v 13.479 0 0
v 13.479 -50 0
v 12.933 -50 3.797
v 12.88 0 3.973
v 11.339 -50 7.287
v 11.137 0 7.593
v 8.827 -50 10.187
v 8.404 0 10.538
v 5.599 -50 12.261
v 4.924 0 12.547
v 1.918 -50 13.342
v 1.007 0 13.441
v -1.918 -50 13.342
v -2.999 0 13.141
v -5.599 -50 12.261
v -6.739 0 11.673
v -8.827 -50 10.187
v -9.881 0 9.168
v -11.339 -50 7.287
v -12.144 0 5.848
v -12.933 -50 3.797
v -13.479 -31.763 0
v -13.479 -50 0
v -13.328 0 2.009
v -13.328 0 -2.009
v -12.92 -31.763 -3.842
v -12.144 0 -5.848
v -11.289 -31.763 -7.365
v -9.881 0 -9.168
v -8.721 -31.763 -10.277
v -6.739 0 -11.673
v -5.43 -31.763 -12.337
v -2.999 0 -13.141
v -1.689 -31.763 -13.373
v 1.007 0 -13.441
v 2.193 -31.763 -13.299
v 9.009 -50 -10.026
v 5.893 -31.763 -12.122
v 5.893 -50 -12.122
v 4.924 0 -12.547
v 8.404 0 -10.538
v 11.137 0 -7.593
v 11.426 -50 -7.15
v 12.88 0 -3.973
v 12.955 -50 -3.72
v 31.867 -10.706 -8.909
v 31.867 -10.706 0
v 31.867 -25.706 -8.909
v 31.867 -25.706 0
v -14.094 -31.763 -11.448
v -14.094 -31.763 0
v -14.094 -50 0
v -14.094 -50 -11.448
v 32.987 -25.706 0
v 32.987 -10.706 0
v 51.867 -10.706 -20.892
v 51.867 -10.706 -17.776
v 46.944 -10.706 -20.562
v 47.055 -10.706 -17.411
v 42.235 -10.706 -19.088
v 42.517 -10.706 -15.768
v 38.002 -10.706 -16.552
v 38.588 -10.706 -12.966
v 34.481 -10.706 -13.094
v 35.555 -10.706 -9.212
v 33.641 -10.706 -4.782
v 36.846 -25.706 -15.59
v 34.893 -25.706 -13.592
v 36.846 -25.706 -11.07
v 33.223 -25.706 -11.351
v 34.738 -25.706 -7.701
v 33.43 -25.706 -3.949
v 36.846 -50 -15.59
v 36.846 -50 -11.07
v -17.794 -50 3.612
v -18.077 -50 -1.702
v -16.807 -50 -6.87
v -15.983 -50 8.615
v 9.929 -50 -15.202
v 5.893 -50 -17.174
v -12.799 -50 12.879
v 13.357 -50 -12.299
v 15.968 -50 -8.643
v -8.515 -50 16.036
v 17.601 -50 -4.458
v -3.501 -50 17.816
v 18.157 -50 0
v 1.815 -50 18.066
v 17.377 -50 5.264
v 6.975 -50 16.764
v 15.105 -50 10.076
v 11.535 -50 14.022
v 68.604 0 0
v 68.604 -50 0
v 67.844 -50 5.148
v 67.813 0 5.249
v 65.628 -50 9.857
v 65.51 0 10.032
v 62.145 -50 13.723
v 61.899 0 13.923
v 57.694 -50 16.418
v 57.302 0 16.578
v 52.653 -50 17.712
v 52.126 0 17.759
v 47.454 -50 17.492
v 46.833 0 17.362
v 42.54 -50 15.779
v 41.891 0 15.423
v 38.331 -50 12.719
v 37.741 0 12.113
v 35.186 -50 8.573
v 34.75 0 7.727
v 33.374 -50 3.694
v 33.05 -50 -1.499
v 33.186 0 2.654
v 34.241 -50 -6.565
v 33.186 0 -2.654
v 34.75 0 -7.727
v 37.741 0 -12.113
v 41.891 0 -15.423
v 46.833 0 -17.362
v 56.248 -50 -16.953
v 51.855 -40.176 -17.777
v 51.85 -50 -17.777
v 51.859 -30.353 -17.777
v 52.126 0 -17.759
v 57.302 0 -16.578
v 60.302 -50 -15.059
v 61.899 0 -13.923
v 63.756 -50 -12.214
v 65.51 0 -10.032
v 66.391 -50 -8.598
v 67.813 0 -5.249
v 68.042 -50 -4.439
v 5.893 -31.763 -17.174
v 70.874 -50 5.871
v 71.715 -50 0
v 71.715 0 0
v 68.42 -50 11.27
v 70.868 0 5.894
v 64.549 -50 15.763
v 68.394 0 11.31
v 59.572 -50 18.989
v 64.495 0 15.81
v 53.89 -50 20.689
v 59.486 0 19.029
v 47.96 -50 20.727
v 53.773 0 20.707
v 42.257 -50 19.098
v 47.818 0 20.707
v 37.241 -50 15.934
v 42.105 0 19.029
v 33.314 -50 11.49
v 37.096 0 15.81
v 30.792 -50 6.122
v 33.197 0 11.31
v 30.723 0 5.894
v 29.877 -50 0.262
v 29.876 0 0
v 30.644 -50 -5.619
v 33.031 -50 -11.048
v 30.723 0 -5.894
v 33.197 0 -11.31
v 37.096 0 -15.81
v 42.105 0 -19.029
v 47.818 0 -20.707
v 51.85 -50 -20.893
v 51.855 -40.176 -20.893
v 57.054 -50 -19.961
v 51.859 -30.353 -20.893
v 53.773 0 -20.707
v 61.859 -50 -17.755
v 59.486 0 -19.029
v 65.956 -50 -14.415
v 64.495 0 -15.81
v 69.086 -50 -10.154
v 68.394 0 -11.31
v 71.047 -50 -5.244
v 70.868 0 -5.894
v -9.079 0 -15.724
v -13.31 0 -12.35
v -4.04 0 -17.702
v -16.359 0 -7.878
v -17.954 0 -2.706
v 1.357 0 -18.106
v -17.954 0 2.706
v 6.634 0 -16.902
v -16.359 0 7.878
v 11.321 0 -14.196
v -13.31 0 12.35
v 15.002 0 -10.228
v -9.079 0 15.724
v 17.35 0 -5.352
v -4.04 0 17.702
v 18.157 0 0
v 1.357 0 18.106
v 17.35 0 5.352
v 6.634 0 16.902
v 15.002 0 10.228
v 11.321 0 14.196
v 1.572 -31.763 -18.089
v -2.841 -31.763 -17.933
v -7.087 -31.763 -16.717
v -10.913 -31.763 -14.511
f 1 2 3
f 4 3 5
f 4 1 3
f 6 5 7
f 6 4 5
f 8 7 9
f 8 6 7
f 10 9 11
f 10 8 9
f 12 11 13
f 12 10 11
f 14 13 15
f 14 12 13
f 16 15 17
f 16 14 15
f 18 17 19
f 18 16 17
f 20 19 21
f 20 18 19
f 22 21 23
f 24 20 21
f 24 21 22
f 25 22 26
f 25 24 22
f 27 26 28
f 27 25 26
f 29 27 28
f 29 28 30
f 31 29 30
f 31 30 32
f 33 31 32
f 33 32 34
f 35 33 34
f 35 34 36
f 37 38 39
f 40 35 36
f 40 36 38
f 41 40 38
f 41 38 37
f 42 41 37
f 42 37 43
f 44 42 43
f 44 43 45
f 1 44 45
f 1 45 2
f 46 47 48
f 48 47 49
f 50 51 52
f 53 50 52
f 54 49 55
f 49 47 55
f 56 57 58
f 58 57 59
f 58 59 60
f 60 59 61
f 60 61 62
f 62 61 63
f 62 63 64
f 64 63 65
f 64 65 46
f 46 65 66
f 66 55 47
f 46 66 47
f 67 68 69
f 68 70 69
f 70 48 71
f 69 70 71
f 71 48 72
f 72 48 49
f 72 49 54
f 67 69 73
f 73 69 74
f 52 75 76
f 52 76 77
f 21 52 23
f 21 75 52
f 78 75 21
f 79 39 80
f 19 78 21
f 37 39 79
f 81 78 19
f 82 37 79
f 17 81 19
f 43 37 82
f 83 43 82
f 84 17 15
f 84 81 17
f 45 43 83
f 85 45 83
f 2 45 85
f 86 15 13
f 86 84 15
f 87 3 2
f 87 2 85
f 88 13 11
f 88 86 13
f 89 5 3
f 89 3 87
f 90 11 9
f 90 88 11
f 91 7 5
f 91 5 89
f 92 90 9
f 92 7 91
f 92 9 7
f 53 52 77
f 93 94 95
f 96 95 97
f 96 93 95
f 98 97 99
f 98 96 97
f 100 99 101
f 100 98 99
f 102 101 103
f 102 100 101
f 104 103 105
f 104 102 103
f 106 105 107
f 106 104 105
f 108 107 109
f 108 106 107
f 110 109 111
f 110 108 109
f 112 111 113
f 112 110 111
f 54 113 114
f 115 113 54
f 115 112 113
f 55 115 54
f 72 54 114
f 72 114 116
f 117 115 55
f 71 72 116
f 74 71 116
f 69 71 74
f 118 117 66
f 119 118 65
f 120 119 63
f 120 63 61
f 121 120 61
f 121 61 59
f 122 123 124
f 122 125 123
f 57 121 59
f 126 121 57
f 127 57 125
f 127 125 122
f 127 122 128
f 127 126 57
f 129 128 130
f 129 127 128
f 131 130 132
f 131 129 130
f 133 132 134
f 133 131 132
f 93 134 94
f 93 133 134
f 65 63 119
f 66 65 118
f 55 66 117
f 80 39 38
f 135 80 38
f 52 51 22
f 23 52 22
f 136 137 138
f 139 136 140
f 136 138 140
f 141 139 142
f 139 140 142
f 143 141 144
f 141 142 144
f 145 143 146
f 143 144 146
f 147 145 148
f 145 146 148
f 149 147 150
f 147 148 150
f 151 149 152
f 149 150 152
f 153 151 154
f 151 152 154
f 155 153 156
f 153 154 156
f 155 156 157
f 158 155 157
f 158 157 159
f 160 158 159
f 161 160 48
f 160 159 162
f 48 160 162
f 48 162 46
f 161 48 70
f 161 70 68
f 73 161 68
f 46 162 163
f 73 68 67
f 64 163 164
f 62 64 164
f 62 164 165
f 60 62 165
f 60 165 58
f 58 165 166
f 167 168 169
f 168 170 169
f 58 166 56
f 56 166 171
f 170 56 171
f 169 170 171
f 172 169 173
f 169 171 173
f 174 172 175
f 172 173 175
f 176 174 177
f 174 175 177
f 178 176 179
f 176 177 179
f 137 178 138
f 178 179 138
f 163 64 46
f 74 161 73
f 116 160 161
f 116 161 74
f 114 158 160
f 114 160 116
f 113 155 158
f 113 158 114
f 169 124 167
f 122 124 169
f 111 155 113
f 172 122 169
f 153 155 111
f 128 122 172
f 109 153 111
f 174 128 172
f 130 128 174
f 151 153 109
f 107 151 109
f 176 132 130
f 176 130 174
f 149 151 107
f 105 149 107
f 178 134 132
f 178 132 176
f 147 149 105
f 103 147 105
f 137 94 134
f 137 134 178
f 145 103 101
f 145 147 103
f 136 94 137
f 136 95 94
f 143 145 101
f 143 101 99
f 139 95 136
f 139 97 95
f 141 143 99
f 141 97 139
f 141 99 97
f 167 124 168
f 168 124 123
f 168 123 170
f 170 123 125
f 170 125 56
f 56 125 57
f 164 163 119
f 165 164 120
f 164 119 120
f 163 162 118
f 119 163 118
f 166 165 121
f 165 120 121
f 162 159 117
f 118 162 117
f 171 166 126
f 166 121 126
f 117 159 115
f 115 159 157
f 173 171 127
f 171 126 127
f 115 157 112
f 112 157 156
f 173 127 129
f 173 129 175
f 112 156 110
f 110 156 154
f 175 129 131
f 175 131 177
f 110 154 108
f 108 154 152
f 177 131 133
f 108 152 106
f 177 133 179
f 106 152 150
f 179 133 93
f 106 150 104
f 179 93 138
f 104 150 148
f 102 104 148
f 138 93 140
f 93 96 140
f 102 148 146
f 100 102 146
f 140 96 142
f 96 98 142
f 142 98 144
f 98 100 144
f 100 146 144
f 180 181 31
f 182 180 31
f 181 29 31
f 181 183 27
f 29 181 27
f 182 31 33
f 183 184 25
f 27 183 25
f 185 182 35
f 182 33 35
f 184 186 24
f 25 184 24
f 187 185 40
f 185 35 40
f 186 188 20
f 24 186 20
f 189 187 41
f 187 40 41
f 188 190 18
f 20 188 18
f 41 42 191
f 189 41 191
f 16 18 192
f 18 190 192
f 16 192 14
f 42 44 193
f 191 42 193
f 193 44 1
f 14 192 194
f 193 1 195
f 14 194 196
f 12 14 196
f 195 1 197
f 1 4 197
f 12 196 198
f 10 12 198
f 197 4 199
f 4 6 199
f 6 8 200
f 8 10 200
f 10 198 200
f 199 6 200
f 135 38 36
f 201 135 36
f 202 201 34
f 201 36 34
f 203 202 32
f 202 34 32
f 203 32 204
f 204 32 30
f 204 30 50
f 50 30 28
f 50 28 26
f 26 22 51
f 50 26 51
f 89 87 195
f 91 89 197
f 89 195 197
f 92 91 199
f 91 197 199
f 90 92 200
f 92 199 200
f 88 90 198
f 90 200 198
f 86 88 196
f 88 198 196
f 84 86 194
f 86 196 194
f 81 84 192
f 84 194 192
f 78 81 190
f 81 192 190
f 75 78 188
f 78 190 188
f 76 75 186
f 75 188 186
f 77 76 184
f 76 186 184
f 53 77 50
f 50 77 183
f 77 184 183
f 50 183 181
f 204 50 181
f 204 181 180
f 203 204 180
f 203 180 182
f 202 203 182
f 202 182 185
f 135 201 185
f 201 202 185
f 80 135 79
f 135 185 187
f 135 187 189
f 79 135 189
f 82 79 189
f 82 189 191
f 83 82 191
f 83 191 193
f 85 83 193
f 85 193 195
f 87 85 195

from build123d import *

# Parameters (mm, degrees)
F0_R     = 18.15707
F0_R_2   = 13.478783
F1_DEPTH = 50
F3_DEPTH = 25
F4_R     = 20.91971
F4_R_2   = 17.808655
F5_DEPTH = 50
F7_DEPTH = 25


with BuildPart() as f1:
    # F0 (on Front) → F1 (new body)
    with BuildSketch(Plane.XZ):
        Circle(F0_R)
        Circle(F0_R_2, mode=Mode.SUBTRACT)
    extrude(amount=F1_DEPTH)

    # F2 (on Top) → F3 (cut)
    with BuildSketch(Plane.XY):
        Polygon((-14.093754, -31.762581), (-14.093754, -66.762581), (5.892819, -66.029838), (5.892819, -31.762581), align=None)
    extrude(amount=-F3_DEPTH, mode=Mode.SUBTRACT)


with BuildPart() as f5:
    # F4 (on Front) → F5 (new body)
    with BuildSketch(Plane.XZ):
        with Locations((50.795469, 0)):
            Circle(F4_R)
        with Locations((50.795469, 0)):
            Circle(F4_R_2, mode=Mode.SUBTRACT)
    extrude(amount=F5_DEPTH)

    # F6 (on Top) → F7 (cut)
    with BuildSketch(Plane.XY):
        Polygon((36.845692, -60.705871), (51.845692, -60.705871), (51.867453, -10.705876), (31.867453, -10.705876), (31.867453, -25.705876), (36.845692, -25.705876), align=None)
    extrude(amount=-F7_DEPTH, mode=Mode.SUBTRACT)


solid = Compound([f1.part, f5.part])
